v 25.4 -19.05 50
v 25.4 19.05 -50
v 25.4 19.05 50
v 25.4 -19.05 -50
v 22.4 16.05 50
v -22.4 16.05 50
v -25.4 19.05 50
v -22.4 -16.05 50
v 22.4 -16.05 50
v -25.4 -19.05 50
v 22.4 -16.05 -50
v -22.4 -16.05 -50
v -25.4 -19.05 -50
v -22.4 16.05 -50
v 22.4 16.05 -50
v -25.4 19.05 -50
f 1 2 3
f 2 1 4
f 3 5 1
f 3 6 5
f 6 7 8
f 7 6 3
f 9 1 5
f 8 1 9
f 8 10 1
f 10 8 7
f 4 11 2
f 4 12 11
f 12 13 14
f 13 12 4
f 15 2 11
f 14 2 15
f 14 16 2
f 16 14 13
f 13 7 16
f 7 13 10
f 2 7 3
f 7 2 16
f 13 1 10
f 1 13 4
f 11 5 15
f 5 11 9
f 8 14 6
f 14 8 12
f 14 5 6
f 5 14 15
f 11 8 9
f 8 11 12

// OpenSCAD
$fn = 64;

outer_w = 50.8;   // mm
outer_h = 38.1;   // mm
wall    = 3.0;    // mm
length  = 100;    // mm (default extrusion length)

inner_w = outer_w - 2*wall;
inner_h = outer_h - 2*wall;

module box_section_rect(outer_w, outer_h, wall, length) {
    inner_w = outer_w - 2*wall;
    inner_h = outer_h - 2*wall;

    if (inner_w <= 0 || inner_h <= 0) {
        cube([outer_w, outer_h, length], center=true);
    } else {
        difference() {
            cube([outer_w, outer_h, length], center=true);
            cube([inner_w, inner_h, length + 0.2], center=true);
        }
    }
}

box_section_rect(outer_w, outer_h, wall, length);
